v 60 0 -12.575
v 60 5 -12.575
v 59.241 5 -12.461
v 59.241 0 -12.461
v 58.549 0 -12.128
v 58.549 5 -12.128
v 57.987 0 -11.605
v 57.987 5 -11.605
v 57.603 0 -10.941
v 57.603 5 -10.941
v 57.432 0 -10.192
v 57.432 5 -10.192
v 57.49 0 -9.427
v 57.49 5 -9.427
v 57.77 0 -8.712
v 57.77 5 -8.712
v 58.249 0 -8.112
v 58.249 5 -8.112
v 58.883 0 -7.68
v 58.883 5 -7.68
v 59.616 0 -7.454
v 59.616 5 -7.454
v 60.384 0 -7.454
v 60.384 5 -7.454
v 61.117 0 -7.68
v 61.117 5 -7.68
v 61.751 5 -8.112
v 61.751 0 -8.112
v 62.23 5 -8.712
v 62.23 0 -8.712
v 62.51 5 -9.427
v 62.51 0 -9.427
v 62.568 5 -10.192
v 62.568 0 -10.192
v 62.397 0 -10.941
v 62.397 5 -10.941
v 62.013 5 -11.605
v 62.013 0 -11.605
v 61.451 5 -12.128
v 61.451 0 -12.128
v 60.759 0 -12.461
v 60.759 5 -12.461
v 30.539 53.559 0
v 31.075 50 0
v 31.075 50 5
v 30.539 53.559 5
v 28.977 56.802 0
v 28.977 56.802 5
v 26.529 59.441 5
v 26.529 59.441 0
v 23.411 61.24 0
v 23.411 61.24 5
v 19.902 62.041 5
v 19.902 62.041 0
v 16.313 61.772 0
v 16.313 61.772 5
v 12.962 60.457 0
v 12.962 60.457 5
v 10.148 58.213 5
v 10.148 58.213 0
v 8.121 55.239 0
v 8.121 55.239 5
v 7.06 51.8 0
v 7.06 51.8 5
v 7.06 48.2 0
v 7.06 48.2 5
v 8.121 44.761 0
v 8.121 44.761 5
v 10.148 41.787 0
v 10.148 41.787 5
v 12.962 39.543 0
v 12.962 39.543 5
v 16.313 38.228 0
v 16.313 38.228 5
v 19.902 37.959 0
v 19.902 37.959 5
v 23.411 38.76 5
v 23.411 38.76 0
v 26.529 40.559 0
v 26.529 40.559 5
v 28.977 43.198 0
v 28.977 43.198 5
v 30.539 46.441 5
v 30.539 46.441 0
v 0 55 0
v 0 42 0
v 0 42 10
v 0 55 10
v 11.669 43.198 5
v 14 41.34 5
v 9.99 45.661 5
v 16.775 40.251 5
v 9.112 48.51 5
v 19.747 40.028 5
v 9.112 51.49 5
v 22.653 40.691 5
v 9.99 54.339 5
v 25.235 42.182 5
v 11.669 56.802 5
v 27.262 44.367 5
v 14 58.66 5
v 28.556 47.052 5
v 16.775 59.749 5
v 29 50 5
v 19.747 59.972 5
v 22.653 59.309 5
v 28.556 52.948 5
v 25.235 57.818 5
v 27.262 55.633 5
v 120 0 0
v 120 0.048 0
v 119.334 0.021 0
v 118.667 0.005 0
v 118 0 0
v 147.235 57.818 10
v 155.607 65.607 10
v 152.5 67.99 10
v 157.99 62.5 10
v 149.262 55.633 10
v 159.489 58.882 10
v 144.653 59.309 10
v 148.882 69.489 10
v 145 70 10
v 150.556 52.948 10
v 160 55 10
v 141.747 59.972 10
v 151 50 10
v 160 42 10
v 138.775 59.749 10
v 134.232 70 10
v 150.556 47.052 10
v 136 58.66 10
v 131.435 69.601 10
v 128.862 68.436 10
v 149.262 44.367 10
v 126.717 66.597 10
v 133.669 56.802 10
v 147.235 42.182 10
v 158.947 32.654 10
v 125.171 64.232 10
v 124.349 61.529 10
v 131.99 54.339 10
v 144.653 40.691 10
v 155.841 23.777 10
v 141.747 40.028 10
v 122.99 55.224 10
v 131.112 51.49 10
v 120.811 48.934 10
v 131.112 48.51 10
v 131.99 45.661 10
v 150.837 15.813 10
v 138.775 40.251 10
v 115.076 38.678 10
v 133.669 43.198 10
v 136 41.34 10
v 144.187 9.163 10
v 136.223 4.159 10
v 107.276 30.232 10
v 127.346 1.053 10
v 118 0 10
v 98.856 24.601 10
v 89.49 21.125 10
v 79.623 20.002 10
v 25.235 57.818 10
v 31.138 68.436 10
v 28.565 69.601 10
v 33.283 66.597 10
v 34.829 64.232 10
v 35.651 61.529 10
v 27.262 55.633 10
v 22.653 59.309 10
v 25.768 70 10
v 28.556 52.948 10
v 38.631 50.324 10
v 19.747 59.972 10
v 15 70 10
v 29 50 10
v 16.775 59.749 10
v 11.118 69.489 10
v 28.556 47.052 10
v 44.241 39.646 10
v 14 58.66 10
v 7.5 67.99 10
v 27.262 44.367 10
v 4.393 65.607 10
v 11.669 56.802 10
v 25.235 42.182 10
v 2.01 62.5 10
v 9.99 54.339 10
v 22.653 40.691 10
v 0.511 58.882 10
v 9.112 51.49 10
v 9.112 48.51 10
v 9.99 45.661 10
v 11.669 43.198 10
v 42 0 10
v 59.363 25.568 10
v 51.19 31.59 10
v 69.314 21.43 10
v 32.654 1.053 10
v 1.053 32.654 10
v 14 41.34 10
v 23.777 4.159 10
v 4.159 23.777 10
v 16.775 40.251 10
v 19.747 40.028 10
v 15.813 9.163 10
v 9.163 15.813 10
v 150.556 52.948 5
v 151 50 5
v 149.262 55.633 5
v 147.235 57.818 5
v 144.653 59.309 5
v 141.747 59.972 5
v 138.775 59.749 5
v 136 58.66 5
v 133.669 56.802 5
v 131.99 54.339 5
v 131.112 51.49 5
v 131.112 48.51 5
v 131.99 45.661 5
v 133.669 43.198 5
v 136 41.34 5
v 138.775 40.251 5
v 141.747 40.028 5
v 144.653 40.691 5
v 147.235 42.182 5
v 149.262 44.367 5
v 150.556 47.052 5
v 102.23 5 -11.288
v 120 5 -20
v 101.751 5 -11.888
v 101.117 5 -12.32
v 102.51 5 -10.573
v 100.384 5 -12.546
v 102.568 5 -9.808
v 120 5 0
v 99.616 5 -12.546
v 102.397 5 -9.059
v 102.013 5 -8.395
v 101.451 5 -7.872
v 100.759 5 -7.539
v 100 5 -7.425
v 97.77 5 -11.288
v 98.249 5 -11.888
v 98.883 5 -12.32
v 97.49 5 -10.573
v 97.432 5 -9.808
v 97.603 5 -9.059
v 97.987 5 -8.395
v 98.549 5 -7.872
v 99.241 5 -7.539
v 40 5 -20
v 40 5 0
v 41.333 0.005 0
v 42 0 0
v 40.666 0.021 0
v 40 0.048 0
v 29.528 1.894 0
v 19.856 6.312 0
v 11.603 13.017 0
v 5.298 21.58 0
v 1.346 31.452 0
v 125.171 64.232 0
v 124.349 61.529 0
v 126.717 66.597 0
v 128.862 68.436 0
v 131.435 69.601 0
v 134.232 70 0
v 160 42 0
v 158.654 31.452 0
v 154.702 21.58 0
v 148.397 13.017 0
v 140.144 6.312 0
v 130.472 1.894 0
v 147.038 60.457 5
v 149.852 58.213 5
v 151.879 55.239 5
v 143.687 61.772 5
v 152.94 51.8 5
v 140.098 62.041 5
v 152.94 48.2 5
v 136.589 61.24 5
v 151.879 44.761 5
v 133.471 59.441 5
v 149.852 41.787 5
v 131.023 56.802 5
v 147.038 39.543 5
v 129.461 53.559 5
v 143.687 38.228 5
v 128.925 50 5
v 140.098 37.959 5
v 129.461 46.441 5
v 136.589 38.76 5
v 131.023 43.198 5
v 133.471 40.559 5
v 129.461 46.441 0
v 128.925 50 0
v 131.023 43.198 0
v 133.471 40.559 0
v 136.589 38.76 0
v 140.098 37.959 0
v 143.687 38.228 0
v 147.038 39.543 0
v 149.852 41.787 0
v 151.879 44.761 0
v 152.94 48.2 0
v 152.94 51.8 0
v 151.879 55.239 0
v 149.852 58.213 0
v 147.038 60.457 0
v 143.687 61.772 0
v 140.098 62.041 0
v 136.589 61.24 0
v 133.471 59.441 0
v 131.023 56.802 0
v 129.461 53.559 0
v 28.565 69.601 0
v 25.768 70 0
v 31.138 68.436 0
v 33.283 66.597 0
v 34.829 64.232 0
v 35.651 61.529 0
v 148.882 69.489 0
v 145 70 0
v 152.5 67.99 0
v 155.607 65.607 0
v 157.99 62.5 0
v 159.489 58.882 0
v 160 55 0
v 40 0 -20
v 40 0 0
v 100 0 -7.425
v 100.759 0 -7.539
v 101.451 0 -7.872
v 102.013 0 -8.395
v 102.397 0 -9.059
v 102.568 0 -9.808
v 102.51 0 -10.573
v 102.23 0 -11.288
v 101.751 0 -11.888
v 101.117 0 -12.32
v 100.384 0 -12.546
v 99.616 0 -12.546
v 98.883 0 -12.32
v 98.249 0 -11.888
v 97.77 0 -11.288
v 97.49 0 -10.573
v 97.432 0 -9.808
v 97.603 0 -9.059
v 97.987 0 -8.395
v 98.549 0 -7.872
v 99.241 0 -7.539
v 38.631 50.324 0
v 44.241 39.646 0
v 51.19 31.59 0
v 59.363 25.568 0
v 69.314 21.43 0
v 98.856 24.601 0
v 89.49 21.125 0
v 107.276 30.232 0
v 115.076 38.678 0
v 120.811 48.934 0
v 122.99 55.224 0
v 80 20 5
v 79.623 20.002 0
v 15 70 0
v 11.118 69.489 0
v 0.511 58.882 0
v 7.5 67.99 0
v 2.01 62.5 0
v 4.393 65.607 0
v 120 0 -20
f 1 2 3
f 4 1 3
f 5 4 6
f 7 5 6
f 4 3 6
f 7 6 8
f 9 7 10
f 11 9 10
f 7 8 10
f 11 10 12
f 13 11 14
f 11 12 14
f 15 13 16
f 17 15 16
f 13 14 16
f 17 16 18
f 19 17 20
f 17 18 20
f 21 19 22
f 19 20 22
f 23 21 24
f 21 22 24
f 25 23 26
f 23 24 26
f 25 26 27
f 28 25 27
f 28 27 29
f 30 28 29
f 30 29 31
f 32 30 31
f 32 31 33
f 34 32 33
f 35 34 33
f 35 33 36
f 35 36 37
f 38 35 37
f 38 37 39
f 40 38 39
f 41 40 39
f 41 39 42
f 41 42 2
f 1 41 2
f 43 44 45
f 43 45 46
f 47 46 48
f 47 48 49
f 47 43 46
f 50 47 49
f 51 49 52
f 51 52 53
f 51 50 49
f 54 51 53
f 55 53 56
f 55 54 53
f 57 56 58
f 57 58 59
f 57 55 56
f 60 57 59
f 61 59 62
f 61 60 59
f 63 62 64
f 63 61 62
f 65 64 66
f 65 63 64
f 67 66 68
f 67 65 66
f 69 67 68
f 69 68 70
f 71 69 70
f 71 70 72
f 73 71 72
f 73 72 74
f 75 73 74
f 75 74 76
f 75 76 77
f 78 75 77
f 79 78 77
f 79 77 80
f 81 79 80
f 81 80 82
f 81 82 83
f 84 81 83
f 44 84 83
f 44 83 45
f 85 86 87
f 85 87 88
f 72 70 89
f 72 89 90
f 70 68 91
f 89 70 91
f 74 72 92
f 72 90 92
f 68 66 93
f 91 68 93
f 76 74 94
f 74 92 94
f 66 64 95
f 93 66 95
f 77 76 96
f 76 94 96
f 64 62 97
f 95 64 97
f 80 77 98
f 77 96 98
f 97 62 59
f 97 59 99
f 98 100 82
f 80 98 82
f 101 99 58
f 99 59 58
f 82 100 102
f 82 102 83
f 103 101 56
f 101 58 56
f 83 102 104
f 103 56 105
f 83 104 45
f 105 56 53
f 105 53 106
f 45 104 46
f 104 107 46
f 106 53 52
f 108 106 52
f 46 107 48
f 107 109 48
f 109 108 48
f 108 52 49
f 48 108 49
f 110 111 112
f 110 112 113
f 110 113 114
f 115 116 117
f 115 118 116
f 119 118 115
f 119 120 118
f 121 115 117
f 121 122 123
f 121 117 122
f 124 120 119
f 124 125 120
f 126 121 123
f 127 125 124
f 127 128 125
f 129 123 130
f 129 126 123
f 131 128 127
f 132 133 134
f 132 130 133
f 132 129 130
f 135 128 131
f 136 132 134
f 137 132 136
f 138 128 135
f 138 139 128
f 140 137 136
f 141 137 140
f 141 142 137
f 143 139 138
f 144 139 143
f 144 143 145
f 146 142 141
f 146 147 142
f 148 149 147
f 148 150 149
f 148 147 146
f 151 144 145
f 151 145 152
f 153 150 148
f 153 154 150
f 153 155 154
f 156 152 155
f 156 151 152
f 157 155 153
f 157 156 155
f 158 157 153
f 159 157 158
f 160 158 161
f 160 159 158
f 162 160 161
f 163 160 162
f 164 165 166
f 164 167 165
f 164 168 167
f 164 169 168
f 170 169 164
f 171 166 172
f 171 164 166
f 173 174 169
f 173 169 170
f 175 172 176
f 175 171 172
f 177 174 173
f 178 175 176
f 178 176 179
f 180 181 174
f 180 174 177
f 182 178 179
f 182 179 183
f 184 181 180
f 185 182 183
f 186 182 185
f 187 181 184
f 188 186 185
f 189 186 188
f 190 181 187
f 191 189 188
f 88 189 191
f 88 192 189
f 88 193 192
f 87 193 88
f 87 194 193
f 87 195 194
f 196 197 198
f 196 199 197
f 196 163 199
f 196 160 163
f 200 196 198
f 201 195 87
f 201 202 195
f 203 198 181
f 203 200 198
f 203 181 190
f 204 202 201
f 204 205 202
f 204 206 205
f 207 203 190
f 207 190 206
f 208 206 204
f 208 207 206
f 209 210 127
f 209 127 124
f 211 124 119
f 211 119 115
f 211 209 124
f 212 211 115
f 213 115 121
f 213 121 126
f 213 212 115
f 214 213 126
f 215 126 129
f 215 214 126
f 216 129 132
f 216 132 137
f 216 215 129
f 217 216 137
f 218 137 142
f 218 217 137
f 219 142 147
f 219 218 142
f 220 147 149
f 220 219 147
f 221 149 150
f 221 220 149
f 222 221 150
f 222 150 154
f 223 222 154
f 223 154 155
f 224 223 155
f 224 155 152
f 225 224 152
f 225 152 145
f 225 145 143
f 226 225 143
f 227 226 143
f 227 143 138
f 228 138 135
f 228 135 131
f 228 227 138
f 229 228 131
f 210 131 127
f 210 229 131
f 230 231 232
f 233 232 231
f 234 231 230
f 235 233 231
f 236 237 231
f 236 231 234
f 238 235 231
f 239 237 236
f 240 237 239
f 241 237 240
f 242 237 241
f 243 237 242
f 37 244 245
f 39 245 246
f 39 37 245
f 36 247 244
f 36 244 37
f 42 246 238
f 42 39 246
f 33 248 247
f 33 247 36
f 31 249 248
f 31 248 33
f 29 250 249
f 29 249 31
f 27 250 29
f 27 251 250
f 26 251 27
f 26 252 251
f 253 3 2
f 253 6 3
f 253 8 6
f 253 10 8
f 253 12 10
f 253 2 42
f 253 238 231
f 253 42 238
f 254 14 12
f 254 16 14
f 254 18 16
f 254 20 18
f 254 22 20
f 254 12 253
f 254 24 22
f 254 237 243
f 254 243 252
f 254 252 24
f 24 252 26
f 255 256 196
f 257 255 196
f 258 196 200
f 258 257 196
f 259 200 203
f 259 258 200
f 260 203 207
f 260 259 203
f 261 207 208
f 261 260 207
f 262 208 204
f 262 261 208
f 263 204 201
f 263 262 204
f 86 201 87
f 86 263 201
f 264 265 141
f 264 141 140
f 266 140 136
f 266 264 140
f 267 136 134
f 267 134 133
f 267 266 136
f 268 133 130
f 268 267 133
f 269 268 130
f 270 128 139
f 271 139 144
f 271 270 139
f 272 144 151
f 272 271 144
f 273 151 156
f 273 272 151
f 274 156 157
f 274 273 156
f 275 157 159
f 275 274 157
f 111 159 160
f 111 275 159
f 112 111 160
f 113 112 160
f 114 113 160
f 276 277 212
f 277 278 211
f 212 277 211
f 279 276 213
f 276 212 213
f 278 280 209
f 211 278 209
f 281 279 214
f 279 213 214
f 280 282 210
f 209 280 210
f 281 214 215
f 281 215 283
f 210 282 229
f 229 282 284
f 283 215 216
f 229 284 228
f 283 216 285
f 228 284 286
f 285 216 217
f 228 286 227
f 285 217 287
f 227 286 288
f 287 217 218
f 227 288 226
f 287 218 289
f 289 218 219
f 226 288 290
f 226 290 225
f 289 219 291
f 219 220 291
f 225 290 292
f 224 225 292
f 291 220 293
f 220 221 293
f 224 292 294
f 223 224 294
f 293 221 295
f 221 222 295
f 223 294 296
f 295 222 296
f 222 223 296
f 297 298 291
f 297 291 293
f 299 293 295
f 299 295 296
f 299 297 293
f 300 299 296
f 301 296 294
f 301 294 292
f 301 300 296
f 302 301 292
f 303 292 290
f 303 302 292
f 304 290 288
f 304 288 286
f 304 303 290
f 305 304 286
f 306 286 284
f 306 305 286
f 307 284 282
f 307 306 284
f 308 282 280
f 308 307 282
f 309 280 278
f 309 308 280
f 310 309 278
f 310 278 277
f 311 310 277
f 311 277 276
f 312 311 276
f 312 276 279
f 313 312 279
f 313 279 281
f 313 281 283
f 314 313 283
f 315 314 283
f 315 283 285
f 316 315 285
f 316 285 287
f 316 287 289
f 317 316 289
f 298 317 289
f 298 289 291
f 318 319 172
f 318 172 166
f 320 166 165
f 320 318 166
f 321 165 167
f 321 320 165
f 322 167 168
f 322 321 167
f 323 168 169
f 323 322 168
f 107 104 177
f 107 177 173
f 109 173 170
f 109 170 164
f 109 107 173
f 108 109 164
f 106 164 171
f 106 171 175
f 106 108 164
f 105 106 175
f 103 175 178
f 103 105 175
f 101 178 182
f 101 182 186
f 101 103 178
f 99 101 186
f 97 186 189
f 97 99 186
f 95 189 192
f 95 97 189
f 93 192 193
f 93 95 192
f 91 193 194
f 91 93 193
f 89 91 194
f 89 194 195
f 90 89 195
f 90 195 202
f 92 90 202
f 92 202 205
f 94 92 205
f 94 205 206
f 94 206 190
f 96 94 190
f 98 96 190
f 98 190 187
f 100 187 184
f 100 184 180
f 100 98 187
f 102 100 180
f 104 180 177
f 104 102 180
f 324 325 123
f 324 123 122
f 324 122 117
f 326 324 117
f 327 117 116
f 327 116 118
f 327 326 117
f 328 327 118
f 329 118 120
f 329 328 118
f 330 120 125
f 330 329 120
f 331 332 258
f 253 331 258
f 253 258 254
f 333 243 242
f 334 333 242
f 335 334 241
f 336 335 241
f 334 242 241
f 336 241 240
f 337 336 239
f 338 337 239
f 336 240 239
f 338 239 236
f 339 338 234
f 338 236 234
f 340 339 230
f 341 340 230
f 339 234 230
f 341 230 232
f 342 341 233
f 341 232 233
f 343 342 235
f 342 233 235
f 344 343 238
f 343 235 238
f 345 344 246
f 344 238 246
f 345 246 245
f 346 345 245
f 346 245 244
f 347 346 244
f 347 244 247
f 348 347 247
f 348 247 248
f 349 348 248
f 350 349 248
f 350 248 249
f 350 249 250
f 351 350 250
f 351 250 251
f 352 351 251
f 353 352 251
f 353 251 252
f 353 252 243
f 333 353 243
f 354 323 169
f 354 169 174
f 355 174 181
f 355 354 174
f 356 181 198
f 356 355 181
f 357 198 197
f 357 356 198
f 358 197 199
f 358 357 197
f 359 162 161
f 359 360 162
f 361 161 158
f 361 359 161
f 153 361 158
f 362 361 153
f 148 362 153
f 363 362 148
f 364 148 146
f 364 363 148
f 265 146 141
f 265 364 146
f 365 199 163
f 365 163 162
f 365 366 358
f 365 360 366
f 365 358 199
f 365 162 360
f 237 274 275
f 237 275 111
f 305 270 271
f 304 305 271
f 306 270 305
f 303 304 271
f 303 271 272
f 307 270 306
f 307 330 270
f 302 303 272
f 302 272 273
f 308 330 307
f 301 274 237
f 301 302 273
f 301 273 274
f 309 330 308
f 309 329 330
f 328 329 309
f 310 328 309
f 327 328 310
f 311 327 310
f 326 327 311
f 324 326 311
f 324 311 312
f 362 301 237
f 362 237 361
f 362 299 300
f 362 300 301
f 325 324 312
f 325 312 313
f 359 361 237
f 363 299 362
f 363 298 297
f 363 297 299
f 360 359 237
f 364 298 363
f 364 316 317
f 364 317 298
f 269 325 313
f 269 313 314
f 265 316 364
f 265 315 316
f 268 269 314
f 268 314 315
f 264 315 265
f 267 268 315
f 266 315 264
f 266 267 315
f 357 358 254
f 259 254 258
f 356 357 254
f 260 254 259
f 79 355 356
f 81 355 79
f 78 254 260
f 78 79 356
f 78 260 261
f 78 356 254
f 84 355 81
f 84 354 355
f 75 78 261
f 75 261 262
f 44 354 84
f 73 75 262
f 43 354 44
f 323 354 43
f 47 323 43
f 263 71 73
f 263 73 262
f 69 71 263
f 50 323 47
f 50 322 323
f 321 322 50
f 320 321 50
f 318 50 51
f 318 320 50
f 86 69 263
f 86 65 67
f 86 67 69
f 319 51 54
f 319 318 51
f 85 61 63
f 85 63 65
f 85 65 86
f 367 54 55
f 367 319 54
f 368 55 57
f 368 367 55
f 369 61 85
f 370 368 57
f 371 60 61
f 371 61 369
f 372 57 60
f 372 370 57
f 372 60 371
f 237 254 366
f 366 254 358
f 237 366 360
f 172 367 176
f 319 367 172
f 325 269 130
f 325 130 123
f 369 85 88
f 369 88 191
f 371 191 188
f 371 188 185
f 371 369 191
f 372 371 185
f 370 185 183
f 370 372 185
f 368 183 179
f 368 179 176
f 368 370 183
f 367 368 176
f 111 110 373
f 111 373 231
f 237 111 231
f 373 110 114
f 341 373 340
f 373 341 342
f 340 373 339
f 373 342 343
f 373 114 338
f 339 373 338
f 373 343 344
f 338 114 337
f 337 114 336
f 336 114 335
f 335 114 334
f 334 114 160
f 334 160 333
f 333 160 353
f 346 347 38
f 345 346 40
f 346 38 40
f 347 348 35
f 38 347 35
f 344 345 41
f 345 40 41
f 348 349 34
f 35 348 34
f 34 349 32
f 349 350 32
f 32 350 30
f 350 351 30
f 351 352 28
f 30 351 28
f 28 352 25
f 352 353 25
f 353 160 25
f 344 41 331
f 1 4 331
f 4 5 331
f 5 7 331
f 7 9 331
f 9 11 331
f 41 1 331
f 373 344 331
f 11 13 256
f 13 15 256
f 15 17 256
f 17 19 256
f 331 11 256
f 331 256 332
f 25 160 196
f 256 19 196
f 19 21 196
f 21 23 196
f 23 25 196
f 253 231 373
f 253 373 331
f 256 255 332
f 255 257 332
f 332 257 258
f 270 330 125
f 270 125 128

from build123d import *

# Parameters (mm, degrees)
SKETCH1_R           = 12.075
BOSS_EXTRUDE1_DEPTH = 10
BOSS_EXTRUDE2_START = -5
SKETCH2_R           = 12.075
SKETCH2_R_2         = 10
BOSS_EXTRUDE2_DEPTH = 5
SKETCH3_W           = 80
SKETCH3_H           = 5
BOSS_EXTRUDE3_DEPTH = 20
SKETCH4_R           = 2.575
CUT_EXTRUDE1_DEPTH  = 174.853386637


with BuildPart() as part:
    # Sketch1 → Boss-Extrude1 (new body)
    with BuildSketch(Plane.XY):
        with BuildLine():
            Line((134.231894093, 70), (145, 70))
            ThreePointArc((145, 70), (155.606601718, 65.606601718), (160, 55))
            Line((160, 55), (160, 42))
            ThreePointArc((160, 42), (147.69848481, 12.30151519), (118, 0))
            Line((118, 0), (42, 0))
            ThreePointArc((42, 0), (12.30151519, 12.30151519), (0, 42))
            Line((0, 42), (0, 55))
            ThreePointArc((0, 55), (4.393398282, 65.606601718), (15, 70))
            Line((15, 70), (25.768105907, 70))
            ThreePointArc((25.768105907, 70), (32.276192497, 67.592417858), (35.650528477, 61.528961786))
            add(Edge.make_bspline(
                [(35.650528477, 61.528961786), (42.075693473, 20), (80, 20), (117.924306527, 20), (124.349471523, 61.528961786)],
                knots=[4.882630888, 4.882630888, 4.882630888, 6.283185307, 6.283185307, 7.683739727, 7.683739727, 7.683739727], degree=2, weights=[1, 0.764663574, 1, 0.764663574, 1]))
            ThreePointArc((124.349471523, 61.528961786), (127.723807503, 67.592417858), (134.231894093, 70))
        make_face()
        with Locations((19, 50)):
            Circle(SKETCH1_R, mode=Mode.SUBTRACT)
        with Locations((141, 50)):
            Circle(SKETCH1_R, mode=Mode.SUBTRACT)
    extrude(amount=BOSS_EXTRUDE1_DEPTH)

    # Sketch2 → Boss-Extrude2 (add)
    # profile 1 of 2: a face of its own
    with BuildSketch(Plane.XY.offset(10).offset(BOSS_EXTRUDE2_START)):
        with Locations((141, 50)):
            Circle(SKETCH2_R)
        with Locations((141, 50)):
            Circle(SKETCH2_R_2, mode=Mode.SUBTRACT)
    # profile 2 of 2: a face of its own
    with BuildSketch(Plane.XY.offset(10).offset(BOSS_EXTRUDE2_START)):
        with Locations((19, 50)):
            Circle(SKETCH2_R)
        with Locations((19, 50)):
            Circle(SKETCH2_R_2, mode=Mode.SUBTRACT)
    extrude(amount=BOSS_EXTRUDE2_DEPTH)

    # Sketch3 → Boss-Extrude3 (add)
    with BuildSketch(Plane(origin=(0, 0, 0), x_dir=(-1, 0, 0), z_dir=(0, 0, -1))):
        with Locations((-80, 2.5)):
            Rectangle(SKETCH3_W, SKETCH3_H)
    extrude(amount=BOSS_EXTRUDE3_DEPTH)

    # Sketch4 → Cut-Extrude1 (cut, through all)
    with BuildSketch(Plane(origin=(0, 5, 0), x_dir=(1, 0, 0), z_dir=(0, 1, 0))):
        with Locations((100, 10)):
            Circle(SKETCH4_R)
        with Locations((60, 10)):
            Circle(SKETCH4_R)
    extrude(amount=-CUT_EXTRUDE1_DEPTH, mode=Mode.SUBTRACT)


solid = part.part
